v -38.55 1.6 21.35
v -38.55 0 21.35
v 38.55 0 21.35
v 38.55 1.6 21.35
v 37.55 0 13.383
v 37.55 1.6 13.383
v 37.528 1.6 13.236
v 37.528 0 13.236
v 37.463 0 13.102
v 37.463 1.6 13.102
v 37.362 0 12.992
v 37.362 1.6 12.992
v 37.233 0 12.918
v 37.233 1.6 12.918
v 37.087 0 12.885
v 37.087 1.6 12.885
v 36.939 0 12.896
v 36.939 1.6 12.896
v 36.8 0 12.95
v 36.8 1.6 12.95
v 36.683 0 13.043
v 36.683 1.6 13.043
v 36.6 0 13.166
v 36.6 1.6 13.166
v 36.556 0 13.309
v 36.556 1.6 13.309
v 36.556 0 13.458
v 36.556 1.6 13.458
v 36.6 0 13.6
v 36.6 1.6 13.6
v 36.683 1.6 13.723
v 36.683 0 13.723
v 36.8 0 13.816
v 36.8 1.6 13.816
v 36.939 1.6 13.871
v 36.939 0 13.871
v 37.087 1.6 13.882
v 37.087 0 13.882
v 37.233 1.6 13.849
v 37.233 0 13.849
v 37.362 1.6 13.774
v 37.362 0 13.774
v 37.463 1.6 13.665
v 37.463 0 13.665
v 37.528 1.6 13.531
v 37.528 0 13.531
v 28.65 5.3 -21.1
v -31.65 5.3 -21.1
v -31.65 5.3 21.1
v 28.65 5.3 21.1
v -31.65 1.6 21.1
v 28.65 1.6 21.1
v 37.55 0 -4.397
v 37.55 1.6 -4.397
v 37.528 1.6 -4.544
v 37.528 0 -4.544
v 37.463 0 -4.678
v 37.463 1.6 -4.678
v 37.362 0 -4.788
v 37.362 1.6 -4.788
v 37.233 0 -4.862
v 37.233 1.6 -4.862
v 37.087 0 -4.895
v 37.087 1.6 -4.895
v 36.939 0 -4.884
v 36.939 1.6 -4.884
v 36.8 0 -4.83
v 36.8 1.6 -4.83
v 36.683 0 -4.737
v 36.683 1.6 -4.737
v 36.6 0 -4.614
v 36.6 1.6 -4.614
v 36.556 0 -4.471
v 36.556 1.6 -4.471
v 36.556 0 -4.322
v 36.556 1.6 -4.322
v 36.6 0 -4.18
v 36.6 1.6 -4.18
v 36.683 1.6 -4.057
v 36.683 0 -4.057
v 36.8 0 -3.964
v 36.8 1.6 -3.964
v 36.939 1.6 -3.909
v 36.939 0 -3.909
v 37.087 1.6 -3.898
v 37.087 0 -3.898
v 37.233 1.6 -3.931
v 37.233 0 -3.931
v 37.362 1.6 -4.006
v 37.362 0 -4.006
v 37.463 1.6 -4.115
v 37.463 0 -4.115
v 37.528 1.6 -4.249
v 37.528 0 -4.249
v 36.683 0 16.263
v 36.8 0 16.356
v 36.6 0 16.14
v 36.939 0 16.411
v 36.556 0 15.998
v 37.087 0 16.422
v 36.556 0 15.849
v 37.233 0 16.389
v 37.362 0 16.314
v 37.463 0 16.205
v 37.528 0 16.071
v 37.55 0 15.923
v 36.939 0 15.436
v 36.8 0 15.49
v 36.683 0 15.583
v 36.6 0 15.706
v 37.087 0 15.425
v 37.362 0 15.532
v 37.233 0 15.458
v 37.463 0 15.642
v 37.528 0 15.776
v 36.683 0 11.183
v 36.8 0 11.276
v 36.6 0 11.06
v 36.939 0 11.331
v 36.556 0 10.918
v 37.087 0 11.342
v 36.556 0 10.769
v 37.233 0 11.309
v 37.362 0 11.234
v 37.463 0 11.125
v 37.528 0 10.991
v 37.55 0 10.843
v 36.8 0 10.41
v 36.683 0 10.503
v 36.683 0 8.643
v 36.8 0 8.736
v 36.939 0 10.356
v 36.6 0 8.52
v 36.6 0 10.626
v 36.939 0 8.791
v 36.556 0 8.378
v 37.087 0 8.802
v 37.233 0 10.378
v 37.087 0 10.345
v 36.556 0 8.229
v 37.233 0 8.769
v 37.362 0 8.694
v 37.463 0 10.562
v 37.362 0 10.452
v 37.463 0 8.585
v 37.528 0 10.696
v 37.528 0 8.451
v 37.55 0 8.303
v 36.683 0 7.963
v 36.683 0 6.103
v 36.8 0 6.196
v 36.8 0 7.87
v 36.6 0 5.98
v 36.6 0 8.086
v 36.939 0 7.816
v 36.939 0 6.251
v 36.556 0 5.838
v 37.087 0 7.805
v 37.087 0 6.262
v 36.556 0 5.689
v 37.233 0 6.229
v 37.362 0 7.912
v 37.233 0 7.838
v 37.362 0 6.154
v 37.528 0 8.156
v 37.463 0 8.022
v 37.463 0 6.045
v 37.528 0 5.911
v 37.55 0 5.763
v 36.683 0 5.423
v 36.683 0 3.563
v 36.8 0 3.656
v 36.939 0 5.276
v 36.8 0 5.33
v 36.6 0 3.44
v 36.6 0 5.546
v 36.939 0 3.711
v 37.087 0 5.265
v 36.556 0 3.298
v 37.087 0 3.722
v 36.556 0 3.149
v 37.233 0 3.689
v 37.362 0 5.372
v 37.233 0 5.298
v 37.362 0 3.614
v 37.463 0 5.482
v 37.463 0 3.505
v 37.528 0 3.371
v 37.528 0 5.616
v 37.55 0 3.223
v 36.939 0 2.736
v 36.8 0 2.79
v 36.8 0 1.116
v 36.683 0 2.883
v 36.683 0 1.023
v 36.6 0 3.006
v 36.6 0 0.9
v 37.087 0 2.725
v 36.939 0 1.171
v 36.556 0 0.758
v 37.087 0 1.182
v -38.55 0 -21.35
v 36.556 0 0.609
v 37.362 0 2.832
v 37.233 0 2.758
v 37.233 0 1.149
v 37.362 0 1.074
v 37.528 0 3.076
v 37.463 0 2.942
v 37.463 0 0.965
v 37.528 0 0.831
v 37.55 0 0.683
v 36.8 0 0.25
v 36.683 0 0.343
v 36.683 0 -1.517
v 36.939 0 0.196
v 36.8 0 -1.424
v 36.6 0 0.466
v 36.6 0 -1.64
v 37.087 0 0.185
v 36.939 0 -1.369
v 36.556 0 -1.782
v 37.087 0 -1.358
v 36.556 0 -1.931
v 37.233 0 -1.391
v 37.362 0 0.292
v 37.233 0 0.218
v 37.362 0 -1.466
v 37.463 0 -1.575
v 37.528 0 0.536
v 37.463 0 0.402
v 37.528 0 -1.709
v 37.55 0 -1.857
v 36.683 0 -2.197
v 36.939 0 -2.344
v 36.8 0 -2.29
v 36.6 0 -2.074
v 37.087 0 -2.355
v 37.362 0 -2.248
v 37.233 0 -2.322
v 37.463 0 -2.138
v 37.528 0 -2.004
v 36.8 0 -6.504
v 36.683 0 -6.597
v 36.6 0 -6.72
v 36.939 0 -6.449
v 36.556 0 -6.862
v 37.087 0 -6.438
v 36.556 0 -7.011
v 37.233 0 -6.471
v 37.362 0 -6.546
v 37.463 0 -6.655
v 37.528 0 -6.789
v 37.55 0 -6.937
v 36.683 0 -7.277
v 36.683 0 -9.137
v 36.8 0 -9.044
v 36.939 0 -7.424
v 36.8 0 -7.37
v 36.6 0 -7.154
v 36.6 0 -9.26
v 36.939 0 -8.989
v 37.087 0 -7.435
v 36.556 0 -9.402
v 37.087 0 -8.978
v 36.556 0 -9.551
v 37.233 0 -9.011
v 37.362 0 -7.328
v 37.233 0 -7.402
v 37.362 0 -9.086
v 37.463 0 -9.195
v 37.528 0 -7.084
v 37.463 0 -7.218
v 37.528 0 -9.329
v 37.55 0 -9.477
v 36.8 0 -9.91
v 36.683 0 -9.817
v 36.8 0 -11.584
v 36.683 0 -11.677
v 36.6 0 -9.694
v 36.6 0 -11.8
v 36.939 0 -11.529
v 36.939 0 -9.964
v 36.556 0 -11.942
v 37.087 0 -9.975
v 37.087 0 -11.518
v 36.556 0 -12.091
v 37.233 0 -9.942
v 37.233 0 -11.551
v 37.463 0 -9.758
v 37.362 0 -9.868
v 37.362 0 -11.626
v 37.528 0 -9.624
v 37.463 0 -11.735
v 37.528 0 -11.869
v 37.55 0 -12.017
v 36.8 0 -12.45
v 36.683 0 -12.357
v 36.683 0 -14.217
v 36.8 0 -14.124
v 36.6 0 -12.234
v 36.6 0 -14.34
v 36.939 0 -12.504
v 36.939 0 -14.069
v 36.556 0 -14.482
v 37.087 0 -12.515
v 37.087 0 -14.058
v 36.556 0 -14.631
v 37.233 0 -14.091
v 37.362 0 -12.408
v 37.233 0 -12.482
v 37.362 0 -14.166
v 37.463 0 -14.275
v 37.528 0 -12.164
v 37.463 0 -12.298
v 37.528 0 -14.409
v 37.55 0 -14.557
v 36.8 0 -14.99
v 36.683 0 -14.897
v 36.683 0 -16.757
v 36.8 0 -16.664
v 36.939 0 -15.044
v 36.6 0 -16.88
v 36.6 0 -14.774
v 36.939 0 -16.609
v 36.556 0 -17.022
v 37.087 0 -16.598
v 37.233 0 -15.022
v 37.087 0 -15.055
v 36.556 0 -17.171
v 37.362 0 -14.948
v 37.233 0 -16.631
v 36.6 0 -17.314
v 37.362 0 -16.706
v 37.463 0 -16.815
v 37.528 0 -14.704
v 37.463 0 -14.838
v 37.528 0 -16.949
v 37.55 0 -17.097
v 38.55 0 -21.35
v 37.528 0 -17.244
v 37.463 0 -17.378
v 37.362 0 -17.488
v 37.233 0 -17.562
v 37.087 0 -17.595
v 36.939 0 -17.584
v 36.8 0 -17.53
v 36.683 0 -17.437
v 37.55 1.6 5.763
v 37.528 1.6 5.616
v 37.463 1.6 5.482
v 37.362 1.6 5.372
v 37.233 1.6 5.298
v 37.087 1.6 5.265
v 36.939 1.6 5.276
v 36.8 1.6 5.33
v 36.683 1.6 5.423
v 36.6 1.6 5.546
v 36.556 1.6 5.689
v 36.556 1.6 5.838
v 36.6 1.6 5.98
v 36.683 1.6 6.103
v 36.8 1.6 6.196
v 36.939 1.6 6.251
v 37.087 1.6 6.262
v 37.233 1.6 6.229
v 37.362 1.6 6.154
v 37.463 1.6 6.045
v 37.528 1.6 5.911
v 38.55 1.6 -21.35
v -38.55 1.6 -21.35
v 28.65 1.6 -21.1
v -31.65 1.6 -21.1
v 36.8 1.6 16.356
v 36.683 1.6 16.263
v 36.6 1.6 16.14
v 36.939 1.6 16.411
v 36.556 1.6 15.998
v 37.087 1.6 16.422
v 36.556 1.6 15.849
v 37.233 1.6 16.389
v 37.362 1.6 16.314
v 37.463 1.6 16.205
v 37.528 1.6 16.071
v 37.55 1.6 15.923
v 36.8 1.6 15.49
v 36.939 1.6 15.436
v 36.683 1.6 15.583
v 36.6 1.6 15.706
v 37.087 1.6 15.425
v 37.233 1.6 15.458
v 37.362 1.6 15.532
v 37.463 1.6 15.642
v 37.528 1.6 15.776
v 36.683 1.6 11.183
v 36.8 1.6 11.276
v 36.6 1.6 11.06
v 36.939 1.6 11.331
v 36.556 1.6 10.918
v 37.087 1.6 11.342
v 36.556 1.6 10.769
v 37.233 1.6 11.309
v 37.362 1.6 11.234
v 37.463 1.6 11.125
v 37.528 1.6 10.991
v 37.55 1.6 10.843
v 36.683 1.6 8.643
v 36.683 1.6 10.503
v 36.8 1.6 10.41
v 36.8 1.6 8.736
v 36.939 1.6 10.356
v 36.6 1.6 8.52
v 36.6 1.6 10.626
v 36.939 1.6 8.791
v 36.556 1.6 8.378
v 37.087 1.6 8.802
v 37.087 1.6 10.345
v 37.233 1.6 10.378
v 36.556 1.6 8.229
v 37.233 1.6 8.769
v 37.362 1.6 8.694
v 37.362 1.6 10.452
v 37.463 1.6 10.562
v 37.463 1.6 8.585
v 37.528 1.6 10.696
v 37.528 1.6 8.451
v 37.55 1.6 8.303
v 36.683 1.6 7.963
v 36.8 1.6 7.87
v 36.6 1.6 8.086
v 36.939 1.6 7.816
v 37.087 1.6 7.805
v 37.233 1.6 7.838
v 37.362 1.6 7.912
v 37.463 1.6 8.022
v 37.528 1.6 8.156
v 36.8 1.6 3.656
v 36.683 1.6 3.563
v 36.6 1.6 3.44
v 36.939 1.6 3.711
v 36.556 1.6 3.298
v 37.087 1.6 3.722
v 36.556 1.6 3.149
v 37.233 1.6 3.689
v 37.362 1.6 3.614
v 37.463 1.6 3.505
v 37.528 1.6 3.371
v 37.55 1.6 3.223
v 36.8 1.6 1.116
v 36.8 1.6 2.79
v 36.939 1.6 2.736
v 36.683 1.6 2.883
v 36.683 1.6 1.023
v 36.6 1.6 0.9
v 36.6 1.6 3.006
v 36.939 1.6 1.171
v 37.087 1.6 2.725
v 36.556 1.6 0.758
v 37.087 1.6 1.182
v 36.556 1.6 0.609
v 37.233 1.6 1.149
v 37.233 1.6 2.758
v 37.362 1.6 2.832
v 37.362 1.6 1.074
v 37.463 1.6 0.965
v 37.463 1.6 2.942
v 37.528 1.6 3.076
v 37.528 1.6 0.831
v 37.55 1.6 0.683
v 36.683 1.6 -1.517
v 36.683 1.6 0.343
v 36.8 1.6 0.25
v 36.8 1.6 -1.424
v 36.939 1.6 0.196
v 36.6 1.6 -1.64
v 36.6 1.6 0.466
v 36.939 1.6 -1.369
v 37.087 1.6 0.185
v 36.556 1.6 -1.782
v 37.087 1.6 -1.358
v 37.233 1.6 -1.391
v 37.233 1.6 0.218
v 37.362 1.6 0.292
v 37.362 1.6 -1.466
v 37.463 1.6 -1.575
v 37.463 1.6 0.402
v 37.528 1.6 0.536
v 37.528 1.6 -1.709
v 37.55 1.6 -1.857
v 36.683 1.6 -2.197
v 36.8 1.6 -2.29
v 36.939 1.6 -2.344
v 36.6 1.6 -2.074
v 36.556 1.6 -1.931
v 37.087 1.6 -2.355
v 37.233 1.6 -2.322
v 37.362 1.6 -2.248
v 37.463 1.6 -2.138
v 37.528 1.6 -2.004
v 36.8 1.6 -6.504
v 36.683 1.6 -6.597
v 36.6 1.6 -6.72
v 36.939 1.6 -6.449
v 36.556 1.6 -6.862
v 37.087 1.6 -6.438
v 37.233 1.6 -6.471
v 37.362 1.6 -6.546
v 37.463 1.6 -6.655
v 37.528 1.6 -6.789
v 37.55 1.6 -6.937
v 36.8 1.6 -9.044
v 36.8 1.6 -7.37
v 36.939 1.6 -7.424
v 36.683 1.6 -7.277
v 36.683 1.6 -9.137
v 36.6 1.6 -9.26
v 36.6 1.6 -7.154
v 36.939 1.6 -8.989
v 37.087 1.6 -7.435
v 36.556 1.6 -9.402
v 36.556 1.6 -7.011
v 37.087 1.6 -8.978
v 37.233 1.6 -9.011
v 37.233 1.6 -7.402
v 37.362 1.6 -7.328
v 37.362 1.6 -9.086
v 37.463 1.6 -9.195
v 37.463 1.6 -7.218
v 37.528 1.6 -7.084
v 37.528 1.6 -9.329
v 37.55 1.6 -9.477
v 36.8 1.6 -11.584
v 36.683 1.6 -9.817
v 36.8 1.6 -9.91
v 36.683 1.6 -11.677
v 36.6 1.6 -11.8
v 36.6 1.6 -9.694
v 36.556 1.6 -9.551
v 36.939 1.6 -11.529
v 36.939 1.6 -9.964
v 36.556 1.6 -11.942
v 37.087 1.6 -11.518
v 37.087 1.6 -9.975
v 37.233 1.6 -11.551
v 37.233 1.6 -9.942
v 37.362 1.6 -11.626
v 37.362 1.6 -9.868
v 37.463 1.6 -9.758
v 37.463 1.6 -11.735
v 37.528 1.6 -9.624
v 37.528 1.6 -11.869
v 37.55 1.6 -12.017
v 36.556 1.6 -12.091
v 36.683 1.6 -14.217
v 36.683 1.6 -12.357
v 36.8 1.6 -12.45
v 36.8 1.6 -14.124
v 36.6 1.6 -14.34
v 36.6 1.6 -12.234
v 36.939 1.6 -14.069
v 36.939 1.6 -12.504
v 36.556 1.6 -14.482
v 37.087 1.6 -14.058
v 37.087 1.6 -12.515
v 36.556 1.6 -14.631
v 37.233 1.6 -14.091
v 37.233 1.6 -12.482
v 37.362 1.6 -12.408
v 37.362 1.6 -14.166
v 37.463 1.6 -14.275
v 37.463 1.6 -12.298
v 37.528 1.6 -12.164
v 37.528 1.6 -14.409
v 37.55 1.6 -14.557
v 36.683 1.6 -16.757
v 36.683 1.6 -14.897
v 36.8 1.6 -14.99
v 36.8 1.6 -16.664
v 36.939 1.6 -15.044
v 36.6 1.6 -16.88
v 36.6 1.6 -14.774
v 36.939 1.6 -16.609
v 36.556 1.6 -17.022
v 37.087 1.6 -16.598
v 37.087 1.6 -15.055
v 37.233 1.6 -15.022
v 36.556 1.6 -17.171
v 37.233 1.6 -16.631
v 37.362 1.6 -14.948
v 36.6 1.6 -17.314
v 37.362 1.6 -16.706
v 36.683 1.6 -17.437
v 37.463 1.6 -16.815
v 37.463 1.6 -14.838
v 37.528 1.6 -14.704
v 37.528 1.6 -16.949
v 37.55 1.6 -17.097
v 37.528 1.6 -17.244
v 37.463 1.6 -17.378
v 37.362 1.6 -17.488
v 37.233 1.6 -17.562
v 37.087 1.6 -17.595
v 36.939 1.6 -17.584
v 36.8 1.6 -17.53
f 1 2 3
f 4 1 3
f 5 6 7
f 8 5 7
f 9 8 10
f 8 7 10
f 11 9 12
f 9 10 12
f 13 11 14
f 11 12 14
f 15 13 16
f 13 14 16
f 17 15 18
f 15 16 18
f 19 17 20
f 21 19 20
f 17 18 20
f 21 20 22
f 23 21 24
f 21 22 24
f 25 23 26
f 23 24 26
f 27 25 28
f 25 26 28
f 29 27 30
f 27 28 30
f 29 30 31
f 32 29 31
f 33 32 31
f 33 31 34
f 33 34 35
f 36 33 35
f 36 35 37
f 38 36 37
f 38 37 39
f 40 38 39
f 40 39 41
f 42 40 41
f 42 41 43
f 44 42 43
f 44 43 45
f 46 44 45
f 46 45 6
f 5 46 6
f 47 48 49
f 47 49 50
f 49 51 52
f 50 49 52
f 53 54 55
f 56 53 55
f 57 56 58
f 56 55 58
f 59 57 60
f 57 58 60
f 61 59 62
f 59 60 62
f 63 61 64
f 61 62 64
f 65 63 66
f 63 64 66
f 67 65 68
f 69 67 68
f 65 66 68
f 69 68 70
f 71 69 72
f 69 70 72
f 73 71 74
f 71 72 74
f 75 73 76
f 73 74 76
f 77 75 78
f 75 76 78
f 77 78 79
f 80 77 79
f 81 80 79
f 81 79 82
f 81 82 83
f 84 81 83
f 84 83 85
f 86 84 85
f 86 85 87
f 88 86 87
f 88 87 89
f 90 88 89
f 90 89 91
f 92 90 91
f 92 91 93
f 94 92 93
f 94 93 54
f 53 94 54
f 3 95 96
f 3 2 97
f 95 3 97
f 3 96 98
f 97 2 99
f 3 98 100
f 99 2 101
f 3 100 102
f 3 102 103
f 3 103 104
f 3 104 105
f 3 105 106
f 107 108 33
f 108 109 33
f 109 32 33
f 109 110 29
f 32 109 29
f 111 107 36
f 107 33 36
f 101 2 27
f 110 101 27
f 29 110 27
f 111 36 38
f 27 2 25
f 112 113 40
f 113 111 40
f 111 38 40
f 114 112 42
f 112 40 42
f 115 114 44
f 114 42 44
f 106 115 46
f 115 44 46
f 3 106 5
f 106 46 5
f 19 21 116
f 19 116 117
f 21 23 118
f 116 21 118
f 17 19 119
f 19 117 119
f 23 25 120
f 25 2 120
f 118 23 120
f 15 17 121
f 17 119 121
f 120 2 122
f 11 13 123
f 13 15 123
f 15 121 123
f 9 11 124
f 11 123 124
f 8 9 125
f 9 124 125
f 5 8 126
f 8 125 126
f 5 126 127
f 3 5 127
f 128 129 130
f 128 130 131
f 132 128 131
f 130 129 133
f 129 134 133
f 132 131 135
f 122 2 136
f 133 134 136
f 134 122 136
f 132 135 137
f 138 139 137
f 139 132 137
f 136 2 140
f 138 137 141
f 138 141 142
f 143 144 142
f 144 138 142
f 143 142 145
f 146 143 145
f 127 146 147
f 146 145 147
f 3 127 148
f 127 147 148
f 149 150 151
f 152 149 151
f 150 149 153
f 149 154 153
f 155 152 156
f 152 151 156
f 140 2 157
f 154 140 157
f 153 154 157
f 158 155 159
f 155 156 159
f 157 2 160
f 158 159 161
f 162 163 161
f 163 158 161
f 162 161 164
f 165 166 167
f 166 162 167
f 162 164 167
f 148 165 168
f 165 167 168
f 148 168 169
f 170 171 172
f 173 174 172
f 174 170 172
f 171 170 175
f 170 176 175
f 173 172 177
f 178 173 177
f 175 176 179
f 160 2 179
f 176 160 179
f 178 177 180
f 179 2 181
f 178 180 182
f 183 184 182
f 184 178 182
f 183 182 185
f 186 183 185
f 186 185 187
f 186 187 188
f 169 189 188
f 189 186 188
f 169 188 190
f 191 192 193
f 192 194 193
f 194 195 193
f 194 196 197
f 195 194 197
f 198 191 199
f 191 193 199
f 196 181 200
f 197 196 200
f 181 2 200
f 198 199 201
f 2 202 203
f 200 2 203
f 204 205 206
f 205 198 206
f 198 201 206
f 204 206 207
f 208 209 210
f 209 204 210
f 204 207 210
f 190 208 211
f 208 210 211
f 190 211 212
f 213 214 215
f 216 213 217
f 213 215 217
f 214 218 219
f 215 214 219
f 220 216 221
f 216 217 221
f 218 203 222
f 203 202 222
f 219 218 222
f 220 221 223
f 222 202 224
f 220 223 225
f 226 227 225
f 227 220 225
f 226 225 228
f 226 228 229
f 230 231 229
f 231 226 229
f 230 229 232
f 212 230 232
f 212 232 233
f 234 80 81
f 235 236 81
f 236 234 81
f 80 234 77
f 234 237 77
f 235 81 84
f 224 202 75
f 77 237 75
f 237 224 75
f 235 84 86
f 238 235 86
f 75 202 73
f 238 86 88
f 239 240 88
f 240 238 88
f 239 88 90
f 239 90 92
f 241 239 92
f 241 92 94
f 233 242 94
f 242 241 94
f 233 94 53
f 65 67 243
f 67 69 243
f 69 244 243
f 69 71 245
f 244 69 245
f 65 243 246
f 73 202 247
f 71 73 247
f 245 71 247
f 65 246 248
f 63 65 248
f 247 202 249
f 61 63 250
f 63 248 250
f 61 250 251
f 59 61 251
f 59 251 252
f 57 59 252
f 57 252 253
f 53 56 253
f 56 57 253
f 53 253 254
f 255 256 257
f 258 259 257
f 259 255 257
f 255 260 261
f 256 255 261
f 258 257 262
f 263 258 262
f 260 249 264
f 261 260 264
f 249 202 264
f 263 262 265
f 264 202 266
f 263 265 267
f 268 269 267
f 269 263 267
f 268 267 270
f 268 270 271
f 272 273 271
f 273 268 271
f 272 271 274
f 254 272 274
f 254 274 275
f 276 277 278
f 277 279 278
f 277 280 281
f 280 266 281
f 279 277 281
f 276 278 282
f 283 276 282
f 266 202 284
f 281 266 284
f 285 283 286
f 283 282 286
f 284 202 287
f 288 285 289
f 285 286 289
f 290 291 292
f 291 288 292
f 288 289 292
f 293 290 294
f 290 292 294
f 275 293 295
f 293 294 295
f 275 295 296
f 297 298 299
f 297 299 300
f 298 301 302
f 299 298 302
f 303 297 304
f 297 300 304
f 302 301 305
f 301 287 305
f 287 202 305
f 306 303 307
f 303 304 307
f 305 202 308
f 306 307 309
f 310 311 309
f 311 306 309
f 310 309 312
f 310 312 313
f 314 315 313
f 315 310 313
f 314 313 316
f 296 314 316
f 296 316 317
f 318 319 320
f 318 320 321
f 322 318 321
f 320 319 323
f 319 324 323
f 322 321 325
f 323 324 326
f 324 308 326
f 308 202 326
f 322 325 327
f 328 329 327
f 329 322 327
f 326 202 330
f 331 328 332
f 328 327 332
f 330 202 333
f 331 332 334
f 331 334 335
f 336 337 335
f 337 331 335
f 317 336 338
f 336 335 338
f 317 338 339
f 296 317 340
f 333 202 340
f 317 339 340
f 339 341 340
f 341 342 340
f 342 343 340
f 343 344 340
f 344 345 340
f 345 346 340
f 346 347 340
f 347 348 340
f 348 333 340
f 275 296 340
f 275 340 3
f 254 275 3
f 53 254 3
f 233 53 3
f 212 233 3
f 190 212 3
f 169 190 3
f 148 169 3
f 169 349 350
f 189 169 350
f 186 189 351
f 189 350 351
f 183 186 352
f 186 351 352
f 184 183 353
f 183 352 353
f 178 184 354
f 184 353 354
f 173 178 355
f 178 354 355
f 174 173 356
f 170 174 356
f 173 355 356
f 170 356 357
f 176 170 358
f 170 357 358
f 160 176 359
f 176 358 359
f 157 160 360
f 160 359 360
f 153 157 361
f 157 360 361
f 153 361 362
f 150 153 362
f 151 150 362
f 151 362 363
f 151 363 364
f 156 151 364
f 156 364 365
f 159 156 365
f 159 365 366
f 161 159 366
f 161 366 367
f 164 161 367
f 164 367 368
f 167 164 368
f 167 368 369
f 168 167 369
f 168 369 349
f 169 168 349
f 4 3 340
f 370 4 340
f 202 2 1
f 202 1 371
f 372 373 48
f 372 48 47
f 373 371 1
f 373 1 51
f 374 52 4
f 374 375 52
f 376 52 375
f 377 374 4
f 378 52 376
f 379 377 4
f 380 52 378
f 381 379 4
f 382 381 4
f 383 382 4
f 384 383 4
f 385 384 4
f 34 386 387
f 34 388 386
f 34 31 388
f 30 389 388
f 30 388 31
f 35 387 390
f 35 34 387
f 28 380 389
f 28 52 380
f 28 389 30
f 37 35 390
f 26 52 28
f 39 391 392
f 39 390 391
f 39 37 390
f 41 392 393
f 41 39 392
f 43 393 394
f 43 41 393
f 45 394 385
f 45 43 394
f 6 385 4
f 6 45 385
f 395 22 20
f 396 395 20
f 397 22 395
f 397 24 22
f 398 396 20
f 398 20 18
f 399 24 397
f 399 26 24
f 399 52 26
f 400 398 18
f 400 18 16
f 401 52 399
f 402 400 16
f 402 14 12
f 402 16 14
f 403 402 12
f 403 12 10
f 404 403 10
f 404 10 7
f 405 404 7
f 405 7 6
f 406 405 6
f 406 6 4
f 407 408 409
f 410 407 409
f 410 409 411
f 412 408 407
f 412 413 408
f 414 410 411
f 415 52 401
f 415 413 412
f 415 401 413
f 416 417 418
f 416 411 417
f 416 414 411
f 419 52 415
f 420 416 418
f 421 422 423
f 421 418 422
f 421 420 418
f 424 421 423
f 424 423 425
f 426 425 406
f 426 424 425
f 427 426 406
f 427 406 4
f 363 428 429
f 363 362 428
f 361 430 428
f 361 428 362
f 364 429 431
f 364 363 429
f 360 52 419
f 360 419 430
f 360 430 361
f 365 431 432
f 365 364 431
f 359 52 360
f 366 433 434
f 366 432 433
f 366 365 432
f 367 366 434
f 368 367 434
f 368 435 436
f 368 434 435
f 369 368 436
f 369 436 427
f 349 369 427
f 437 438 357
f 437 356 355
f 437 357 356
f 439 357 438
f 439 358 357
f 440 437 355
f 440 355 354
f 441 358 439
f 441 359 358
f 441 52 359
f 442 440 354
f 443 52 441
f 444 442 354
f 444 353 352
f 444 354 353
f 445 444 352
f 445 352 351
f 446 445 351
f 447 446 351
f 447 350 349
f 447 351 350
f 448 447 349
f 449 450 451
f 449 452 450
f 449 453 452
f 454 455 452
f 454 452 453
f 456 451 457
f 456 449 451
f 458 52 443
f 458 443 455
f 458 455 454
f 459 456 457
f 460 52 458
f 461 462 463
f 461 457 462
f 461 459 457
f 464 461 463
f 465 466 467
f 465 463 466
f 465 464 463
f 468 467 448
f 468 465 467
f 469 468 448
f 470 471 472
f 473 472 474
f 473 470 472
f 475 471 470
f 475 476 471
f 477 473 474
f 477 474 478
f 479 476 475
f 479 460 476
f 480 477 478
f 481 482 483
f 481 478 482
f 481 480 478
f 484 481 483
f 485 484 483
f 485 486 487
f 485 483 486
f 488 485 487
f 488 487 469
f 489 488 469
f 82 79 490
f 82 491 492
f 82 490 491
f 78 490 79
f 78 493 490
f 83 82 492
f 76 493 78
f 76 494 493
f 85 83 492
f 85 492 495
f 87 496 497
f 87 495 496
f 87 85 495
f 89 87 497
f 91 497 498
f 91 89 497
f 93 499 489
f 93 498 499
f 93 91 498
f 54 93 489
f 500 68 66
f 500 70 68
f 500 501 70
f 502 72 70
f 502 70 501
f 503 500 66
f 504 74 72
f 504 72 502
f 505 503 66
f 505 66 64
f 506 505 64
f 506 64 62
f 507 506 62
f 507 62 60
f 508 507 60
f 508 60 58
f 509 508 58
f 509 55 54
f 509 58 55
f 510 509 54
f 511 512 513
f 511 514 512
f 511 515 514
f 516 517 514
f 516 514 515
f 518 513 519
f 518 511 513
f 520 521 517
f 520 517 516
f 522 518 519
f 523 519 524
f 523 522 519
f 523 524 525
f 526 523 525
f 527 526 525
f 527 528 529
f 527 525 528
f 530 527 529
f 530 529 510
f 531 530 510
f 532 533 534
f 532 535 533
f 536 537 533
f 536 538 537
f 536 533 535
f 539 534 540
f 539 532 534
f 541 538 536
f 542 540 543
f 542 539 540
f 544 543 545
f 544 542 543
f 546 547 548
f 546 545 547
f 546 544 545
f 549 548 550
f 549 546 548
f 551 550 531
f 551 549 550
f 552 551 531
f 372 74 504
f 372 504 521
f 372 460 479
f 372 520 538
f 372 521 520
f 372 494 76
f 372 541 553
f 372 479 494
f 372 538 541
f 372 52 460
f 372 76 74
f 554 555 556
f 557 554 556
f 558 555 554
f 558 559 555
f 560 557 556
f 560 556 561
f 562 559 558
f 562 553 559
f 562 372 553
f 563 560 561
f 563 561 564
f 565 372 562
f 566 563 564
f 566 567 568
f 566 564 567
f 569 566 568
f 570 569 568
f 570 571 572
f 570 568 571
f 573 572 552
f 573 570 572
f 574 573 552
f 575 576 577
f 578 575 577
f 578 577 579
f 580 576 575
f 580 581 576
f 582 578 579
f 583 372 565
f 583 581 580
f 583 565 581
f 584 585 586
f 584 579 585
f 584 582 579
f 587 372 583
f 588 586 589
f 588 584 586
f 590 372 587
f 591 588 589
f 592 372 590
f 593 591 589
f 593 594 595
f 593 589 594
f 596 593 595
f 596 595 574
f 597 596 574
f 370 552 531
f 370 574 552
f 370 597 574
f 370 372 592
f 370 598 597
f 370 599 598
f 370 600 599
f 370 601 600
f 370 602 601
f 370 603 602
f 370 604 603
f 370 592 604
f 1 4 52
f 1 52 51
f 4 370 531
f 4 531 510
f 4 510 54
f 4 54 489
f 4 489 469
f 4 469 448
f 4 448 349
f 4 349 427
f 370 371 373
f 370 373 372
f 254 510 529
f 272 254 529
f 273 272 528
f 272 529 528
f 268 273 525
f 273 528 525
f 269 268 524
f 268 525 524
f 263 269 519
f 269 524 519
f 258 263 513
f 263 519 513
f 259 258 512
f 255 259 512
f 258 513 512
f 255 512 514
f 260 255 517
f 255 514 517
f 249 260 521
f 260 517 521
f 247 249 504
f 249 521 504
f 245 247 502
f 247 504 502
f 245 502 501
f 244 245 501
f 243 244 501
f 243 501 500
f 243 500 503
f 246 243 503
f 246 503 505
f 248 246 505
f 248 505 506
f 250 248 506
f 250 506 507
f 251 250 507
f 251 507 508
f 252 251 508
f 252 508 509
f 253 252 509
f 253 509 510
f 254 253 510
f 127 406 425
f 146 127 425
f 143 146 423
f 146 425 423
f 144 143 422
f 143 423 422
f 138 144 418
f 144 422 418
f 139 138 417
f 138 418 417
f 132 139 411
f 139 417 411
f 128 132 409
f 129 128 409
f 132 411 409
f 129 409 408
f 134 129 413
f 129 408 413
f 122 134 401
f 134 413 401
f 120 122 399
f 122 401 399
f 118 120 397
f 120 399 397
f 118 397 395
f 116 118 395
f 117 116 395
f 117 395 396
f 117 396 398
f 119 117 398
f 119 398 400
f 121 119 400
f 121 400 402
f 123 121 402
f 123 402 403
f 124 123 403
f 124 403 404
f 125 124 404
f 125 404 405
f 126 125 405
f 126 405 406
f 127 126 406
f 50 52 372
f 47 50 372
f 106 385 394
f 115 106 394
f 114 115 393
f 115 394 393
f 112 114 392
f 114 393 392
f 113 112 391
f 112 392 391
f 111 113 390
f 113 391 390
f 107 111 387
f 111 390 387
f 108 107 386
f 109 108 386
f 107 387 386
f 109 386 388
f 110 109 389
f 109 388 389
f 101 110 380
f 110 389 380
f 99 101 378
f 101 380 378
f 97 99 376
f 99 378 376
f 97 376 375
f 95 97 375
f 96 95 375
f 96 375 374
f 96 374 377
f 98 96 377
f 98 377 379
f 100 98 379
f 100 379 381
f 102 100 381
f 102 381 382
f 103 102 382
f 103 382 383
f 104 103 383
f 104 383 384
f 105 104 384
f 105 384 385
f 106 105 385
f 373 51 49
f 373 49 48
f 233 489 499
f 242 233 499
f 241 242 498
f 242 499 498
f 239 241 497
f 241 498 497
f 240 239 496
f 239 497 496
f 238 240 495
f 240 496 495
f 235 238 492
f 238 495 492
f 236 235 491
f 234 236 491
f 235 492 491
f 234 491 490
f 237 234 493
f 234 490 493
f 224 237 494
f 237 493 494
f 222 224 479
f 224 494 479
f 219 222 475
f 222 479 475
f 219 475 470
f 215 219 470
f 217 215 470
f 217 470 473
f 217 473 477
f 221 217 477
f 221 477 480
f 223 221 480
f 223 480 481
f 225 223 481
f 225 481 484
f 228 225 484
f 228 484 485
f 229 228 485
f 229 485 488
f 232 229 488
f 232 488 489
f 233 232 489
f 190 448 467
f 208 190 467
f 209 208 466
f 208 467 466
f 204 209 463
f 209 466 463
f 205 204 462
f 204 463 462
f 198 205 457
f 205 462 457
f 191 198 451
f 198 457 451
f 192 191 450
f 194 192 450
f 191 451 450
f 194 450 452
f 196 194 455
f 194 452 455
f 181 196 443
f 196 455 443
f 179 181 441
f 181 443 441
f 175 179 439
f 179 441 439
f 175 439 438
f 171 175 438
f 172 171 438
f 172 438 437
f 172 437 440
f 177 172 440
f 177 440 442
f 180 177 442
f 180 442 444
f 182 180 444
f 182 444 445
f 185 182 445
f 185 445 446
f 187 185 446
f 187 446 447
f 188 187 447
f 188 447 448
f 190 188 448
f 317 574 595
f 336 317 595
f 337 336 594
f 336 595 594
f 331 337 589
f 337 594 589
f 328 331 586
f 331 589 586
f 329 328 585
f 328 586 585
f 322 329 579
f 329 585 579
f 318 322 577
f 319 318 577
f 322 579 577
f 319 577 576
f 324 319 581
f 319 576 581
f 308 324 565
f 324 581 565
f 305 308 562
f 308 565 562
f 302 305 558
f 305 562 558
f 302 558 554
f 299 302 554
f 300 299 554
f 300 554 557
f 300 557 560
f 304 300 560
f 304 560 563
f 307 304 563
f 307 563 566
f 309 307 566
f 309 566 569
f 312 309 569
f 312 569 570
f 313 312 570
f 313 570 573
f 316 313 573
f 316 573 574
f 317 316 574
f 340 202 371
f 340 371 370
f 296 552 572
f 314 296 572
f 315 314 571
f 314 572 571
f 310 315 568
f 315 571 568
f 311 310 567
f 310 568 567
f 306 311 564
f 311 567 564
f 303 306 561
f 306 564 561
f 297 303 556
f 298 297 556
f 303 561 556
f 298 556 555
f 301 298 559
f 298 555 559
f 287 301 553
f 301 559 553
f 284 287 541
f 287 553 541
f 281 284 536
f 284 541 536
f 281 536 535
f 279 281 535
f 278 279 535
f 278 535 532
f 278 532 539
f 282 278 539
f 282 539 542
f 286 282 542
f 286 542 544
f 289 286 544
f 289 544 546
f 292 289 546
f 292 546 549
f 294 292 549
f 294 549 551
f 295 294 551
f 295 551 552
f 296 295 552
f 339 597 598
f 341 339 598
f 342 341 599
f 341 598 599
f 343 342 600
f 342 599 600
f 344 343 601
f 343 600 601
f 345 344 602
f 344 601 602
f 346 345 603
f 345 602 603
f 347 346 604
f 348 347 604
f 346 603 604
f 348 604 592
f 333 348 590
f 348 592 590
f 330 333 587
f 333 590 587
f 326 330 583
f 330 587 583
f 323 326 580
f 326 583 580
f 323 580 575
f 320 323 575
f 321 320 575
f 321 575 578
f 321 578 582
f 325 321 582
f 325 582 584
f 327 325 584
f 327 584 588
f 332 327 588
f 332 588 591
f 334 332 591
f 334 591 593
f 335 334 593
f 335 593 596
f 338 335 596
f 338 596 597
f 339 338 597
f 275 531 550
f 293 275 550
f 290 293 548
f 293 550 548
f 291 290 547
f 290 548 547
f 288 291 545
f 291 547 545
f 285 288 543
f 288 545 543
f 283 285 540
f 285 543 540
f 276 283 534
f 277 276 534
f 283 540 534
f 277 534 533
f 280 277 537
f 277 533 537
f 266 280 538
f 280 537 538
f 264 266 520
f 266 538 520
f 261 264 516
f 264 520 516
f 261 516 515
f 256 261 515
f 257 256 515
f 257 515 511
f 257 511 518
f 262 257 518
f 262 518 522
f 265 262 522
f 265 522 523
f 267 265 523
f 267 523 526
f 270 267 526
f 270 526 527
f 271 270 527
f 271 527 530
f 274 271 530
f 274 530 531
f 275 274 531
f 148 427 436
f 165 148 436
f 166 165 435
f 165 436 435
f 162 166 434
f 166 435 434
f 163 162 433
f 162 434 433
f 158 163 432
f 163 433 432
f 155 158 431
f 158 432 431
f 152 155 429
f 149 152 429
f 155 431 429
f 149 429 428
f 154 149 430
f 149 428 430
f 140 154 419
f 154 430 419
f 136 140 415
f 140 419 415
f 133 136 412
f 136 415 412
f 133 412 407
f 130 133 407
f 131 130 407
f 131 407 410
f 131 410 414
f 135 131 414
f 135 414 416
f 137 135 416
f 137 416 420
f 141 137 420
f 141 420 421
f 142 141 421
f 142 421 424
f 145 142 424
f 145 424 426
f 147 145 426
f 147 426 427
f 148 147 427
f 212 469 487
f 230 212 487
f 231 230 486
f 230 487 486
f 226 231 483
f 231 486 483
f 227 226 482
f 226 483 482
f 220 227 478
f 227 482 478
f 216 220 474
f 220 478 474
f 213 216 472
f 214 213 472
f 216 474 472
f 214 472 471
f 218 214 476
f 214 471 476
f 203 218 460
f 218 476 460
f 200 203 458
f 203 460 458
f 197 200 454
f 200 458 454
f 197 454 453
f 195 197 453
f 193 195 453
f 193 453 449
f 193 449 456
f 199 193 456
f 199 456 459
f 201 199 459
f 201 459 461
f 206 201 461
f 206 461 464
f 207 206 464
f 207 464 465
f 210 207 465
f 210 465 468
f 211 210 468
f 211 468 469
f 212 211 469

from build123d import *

# Parameters (mm, degrees)
CROQUIS1_W              = 77.1
CROQUIS1_H              = 42.7
SALIENTE_EXTRUIR1_DEPTH = 1.6
CROQUIS2_W              = 60.3
CROQUIS2_H              = 42.2
SALIENTE_EXTRUIR2_DEPTH = 3.7
CORTAR_EXTRUIR1_REACH   = 3.6
CROQUIS3_R              = 0.5


with BuildPart() as part:
    # Croquis1 → Saliente-Extruir1 (new body)
    with BuildSketch(Plane(origin=(0, 0, 0), x_dir=(1, 0, 0), z_dir=(0, 1, 0))):
        Rectangle(CROQUIS1_W, CROQUIS1_H)
    extrude(amount=SALIENTE_EXTRUIR1_DEPTH)

    # Croquis2 → Saliente-Extruir2 (add)
    with BuildSketch(Plane(origin=(0, 1.6, 0), x_dir=(1, 0, 0), z_dir=(0, 1, 0))):
        with Locations((-1.5, 0)):
            Rectangle(CROQUIS2_W, CROQUIS2_H)
    extrude(amount=SALIENTE_EXTRUIR2_DEPTH)

    # Croquis3 → Cortar-Extruir1 (cut, up to next)
    with BuildSketch(Plane(origin=(0, 1.6, 0), x_dir=(1, 0, 0), z_dir=(0, 1, 0)), mode=Mode.PRIVATE) as cortar_extruir1_sk1:
        with Locations((37.05, -15.923235508)):
            Circle(CROQUIS3_R)
    cortar_extruir1_tool1 = extrude(cortar_extruir1_sk1.sketch, amount=-CORTAR_EXTRUIR1_REACH, mode=Mode.PRIVATE) & part.part
    add(cortar_extruir1_tool1.solids().sort_by_distance((37.05, 1.6, 15.923236))[0], mode=Mode.SUBTRACT)
    # Croquis3 → Cortar-Extruir1 (cut, up to next)
    with BuildSketch(Plane(origin=(0, 1.6, 0), x_dir=(1, 0, 0), z_dir=(0, 1, 0)), mode=Mode.PRIVATE) as cortar_extruir1_sk2:
        with Locations((37.05, -13.383235508)):
            Circle(CROQUIS3_R)
    cortar_extruir1_tool2 = extrude(cortar_extruir1_sk2.sketch, amount=-CORTAR_EXTRUIR1_REACH, mode=Mode.PRIVATE) & part.part
    add(cortar_extruir1_tool2.solids().sort_by_distance((37.05, 1.6, 13.383236))[0], mode=Mode.SUBTRACT)
    # Croquis3 → Cortar-Extruir1 (cut, up to next)
    with BuildSketch(Plane(origin=(0, 1.6, 0), x_dir=(1, 0, 0), z_dir=(0, 1, 0)), mode=Mode.PRIVATE) as cortar_extruir1_sk3:
        with Locations((37.05, -10.843235508)):
            Circle(CROQUIS3_R)
    cortar_extruir1_tool3 = extrude(cortar_extruir1_sk3.sketch, amount=-CORTAR_EXTRUIR1_REACH, mode=Mode.PRIVATE) & part.part
    add(cortar_extruir1_tool3.solids().sort_by_distance((37.05, 1.6, 10.843236))[0], mode=Mode.SUBTRACT)
    # Croquis3 → Cortar-Extruir1 (cut, up to next)
    with BuildSketch(Plane(origin=(0, 1.6, 0), x_dir=(1, 0, 0), z_dir=(0, 1, 0)), mode=Mode.PRIVATE) as cortar_extruir1_sk4:
        with Locations((37.05, -8.303235508)):
            Circle(CROQUIS3_R)
    cortar_extruir1_tool4 = extrude(cortar_extruir1_sk4.sketch, amount=-CORTAR_EXTRUIR1_REACH, mode=Mode.PRIVATE) & part.part
    add(cortar_extruir1_tool4.solids().sort_by_distance((37.05, 1.6, 8.303236))[0], mode=Mode.SUBTRACT)
    # Croquis3 → Cortar-Extruir1 (cut, up to next)
    with BuildSketch(Plane(origin=(0, 1.6, 0), x_dir=(1, 0, 0), z_dir=(0, 1, 0)), mode=Mode.PRIVATE) as cortar_extruir1_sk5:
        with Locations((37.05, -5.763235508)):
            Circle(CROQUIS3_R)
    cortar_extruir1_tool5 = extrude(cortar_extruir1_sk5.sketch, amount=-CORTAR_EXTRUIR1_REACH, mode=Mode.PRIVATE) & part.part
    add(cortar_extruir1_tool5.solids().sort_by_distance((37.05, 1.6, 5.763236))[0], mode=Mode.SUBTRACT)
    # Croquis3 → Cortar-Extruir1 (cut, up to next)
    with BuildSketch(Plane(origin=(0, 1.6, 0), x_dir=(1, 0, 0), z_dir=(0, 1, 0)), mode=Mode.PRIVATE) as cortar_extruir1_sk6:
        with Locations((37.05, -3.223235508)):
            Circle(CROQUIS3_R)
    cortar_extruir1_tool6 = extrude(cortar_extruir1_sk6.sketch, amount=-CORTAR_EXTRUIR1_REACH, mode=Mode.PRIVATE) & part.part
    add(cortar_extruir1_tool6.solids().sort_by_distance((37.05, 1.6, 3.223236))[0], mode=Mode.SUBTRACT)
    # Croquis3 → Cortar-Extruir1 (cut, up to next)
    with BuildSketch(Plane(origin=(0, 1.6, 0), x_dir=(1, 0, 0), z_dir=(0, 1, 0)), mode=Mode.PRIVATE) as cortar_extruir1_sk7:
        with Locations((37.05, -0.683235508)):
            Circle(CROQUIS3_R)
    cortar_extruir1_tool7 = extrude(cortar_extruir1_sk7.sketch, amount=-CORTAR_EXTRUIR1_REACH, mode=Mode.PRIVATE) & part.part
    add(cortar_extruir1_tool7.solids().sort_by_distance((37.05, 1.6, 0.683236))[0], mode=Mode.SUBTRACT)
    # Croquis3 → Cortar-Extruir1 (cut, up to next)
    with BuildSketch(Plane(origin=(0, 1.6, 0), x_dir=(1, 0, 0), z_dir=(0, 1, 0)), mode=Mode.PRIVATE) as cortar_extruir1_sk8:
        with Locations((37.05, 1.856764492)):
            Circle(CROQUIS3_R)
    cortar_extruir1_tool8 = extrude(cortar_extruir1_sk8.sketch, amount=-CORTAR_EXTRUIR1_REACH, mode=Mode.PRIVATE) & part.part
    add(cortar_extruir1_tool8.solids().sort_by_distance((37.05, 1.6, -1.856764))[0], mode=Mode.SUBTRACT)
    # Croquis3 → Cortar-Extruir1 (cut, up to next)
    with BuildSketch(Plane(origin=(0, 1.6, 0), x_dir=(1, 0, 0), z_dir=(0, 1, 0)), mode=Mode.PRIVATE) as cortar_extruir1_sk9:
        with Locations((37.05, 4.396764492)):
            Circle(CROQUIS3_R)
    cortar_extruir1_tool9 = extrude(cortar_extruir1_sk9.sketch, amount=-CORTAR_EXTRUIR1_REACH, mode=Mode.PRIVATE) & part.part
    add(cortar_extruir1_tool9.solids().sort_by_distance((37.05, 1.6, -4.396764))[0], mode=Mode.SUBTRACT)
    # Croquis3 → Cortar-Extruir1 (cut, up to next)
    with BuildSketch(Plane(origin=(0, 1.6, 0), x_dir=(1, 0, 0), z_dir=(0, 1, 0)), mode=Mode.PRIVATE) as cortar_extruir1_sk10:
        with Locations((37.05, 6.936764492)):
            Circle(CROQUIS3_R)
    cortar_extruir1_tool10 = extrude(cortar_extruir1_sk10.sketch, amount=-CORTAR_EXTRUIR1_REACH, mode=Mode.PRIVATE) & part.part
    add(cortar_extruir1_tool10.solids().sort_by_distance((37.05, 1.6, -6.936764))[0], mode=Mode.SUBTRACT)
    # Croquis3 → Cortar-Extruir1 (cut, up to next)
    with BuildSketch(Plane(origin=(0, 1.6, 0), x_dir=(1, 0, 0), z_dir=(0, 1, 0)), mode=Mode.PRIVATE) as cortar_extruir1_sk11:
        with Locations((37.05, 9.476764492)):
            Circle(CROQUIS3_R)
    cortar_extruir1_tool11 = extrude(cortar_extruir1_sk11.sketch, amount=-CORTAR_EXTRUIR1_REACH, mode=Mode.PRIVATE) & part.part
    add(cortar_extruir1_tool11.solids().sort_by_distance((37.05, 1.6, -9.476764))[0], mode=Mode.SUBTRACT)
    # Croquis3 → Cortar-Extruir1 (cut, up to next)
    with BuildSketch(Plane(origin=(0, 1.6, 0), x_dir=(1, 0, 0), z_dir=(0, 1, 0)), mode=Mode.PRIVATE) as cortar_extruir1_sk12:
        with Locations((37.05, 12.016764492)):
            Circle(CROQUIS3_R)
    cortar_extruir1_tool12 = extrude(cortar_extruir1_sk12.sketch, amount=-CORTAR_EXTRUIR1_REACH, mode=Mode.PRIVATE) & part.part
    add(cortar_extruir1_tool12.solids().sort_by_distance((37.05, 1.6, -12.016764))[0], mode=Mode.SUBTRACT)
    # Croquis3 → Cortar-Extruir1 (cut, up to next)
    with BuildSketch(Plane(origin=(0, 1.6, 0), x_dir=(1, 0, 0), z_dir=(0, 1, 0)), mode=Mode.PRIVATE) as cortar_extruir1_sk13:
        with Locations((37.05, 14.556764492)):
            Circle(CROQUIS3_R)
    cortar_extruir1_tool13 = extrude(cortar_extruir1_sk13.sketch, amount=-CORTAR_EXTRUIR1_REACH, mode=Mode.PRIVATE) & part.part
    add(cortar_extruir1_tool13.solids().sort_by_distance((37.05, 1.6, -14.556764))[0], mode=Mode.SUBTRACT)
    # Croquis3 → Cortar-Extruir1 (cut, up to next)
    with BuildSketch(Plane(origin=(0, 1.6, 0), x_dir=(1, 0, 0), z_dir=(0, 1, 0)), mode=Mode.PRIVATE) as cortar_extruir1_sk14:
        with Locations((37.05, 17.096764492)):
            Circle(CROQUIS3_R)
    cortar_extruir1_tool14 = extrude(cortar_extruir1_sk14.sketch, amount=-CORTAR_EXTRUIR1_REACH, mode=Mode.PRIVATE) & part.part
    add(cortar_extruir1_tool14.solids().sort_by_distance((37.05, 1.6, -17.096764))[0], mode=Mode.SUBTRACT)


solid = part.part
